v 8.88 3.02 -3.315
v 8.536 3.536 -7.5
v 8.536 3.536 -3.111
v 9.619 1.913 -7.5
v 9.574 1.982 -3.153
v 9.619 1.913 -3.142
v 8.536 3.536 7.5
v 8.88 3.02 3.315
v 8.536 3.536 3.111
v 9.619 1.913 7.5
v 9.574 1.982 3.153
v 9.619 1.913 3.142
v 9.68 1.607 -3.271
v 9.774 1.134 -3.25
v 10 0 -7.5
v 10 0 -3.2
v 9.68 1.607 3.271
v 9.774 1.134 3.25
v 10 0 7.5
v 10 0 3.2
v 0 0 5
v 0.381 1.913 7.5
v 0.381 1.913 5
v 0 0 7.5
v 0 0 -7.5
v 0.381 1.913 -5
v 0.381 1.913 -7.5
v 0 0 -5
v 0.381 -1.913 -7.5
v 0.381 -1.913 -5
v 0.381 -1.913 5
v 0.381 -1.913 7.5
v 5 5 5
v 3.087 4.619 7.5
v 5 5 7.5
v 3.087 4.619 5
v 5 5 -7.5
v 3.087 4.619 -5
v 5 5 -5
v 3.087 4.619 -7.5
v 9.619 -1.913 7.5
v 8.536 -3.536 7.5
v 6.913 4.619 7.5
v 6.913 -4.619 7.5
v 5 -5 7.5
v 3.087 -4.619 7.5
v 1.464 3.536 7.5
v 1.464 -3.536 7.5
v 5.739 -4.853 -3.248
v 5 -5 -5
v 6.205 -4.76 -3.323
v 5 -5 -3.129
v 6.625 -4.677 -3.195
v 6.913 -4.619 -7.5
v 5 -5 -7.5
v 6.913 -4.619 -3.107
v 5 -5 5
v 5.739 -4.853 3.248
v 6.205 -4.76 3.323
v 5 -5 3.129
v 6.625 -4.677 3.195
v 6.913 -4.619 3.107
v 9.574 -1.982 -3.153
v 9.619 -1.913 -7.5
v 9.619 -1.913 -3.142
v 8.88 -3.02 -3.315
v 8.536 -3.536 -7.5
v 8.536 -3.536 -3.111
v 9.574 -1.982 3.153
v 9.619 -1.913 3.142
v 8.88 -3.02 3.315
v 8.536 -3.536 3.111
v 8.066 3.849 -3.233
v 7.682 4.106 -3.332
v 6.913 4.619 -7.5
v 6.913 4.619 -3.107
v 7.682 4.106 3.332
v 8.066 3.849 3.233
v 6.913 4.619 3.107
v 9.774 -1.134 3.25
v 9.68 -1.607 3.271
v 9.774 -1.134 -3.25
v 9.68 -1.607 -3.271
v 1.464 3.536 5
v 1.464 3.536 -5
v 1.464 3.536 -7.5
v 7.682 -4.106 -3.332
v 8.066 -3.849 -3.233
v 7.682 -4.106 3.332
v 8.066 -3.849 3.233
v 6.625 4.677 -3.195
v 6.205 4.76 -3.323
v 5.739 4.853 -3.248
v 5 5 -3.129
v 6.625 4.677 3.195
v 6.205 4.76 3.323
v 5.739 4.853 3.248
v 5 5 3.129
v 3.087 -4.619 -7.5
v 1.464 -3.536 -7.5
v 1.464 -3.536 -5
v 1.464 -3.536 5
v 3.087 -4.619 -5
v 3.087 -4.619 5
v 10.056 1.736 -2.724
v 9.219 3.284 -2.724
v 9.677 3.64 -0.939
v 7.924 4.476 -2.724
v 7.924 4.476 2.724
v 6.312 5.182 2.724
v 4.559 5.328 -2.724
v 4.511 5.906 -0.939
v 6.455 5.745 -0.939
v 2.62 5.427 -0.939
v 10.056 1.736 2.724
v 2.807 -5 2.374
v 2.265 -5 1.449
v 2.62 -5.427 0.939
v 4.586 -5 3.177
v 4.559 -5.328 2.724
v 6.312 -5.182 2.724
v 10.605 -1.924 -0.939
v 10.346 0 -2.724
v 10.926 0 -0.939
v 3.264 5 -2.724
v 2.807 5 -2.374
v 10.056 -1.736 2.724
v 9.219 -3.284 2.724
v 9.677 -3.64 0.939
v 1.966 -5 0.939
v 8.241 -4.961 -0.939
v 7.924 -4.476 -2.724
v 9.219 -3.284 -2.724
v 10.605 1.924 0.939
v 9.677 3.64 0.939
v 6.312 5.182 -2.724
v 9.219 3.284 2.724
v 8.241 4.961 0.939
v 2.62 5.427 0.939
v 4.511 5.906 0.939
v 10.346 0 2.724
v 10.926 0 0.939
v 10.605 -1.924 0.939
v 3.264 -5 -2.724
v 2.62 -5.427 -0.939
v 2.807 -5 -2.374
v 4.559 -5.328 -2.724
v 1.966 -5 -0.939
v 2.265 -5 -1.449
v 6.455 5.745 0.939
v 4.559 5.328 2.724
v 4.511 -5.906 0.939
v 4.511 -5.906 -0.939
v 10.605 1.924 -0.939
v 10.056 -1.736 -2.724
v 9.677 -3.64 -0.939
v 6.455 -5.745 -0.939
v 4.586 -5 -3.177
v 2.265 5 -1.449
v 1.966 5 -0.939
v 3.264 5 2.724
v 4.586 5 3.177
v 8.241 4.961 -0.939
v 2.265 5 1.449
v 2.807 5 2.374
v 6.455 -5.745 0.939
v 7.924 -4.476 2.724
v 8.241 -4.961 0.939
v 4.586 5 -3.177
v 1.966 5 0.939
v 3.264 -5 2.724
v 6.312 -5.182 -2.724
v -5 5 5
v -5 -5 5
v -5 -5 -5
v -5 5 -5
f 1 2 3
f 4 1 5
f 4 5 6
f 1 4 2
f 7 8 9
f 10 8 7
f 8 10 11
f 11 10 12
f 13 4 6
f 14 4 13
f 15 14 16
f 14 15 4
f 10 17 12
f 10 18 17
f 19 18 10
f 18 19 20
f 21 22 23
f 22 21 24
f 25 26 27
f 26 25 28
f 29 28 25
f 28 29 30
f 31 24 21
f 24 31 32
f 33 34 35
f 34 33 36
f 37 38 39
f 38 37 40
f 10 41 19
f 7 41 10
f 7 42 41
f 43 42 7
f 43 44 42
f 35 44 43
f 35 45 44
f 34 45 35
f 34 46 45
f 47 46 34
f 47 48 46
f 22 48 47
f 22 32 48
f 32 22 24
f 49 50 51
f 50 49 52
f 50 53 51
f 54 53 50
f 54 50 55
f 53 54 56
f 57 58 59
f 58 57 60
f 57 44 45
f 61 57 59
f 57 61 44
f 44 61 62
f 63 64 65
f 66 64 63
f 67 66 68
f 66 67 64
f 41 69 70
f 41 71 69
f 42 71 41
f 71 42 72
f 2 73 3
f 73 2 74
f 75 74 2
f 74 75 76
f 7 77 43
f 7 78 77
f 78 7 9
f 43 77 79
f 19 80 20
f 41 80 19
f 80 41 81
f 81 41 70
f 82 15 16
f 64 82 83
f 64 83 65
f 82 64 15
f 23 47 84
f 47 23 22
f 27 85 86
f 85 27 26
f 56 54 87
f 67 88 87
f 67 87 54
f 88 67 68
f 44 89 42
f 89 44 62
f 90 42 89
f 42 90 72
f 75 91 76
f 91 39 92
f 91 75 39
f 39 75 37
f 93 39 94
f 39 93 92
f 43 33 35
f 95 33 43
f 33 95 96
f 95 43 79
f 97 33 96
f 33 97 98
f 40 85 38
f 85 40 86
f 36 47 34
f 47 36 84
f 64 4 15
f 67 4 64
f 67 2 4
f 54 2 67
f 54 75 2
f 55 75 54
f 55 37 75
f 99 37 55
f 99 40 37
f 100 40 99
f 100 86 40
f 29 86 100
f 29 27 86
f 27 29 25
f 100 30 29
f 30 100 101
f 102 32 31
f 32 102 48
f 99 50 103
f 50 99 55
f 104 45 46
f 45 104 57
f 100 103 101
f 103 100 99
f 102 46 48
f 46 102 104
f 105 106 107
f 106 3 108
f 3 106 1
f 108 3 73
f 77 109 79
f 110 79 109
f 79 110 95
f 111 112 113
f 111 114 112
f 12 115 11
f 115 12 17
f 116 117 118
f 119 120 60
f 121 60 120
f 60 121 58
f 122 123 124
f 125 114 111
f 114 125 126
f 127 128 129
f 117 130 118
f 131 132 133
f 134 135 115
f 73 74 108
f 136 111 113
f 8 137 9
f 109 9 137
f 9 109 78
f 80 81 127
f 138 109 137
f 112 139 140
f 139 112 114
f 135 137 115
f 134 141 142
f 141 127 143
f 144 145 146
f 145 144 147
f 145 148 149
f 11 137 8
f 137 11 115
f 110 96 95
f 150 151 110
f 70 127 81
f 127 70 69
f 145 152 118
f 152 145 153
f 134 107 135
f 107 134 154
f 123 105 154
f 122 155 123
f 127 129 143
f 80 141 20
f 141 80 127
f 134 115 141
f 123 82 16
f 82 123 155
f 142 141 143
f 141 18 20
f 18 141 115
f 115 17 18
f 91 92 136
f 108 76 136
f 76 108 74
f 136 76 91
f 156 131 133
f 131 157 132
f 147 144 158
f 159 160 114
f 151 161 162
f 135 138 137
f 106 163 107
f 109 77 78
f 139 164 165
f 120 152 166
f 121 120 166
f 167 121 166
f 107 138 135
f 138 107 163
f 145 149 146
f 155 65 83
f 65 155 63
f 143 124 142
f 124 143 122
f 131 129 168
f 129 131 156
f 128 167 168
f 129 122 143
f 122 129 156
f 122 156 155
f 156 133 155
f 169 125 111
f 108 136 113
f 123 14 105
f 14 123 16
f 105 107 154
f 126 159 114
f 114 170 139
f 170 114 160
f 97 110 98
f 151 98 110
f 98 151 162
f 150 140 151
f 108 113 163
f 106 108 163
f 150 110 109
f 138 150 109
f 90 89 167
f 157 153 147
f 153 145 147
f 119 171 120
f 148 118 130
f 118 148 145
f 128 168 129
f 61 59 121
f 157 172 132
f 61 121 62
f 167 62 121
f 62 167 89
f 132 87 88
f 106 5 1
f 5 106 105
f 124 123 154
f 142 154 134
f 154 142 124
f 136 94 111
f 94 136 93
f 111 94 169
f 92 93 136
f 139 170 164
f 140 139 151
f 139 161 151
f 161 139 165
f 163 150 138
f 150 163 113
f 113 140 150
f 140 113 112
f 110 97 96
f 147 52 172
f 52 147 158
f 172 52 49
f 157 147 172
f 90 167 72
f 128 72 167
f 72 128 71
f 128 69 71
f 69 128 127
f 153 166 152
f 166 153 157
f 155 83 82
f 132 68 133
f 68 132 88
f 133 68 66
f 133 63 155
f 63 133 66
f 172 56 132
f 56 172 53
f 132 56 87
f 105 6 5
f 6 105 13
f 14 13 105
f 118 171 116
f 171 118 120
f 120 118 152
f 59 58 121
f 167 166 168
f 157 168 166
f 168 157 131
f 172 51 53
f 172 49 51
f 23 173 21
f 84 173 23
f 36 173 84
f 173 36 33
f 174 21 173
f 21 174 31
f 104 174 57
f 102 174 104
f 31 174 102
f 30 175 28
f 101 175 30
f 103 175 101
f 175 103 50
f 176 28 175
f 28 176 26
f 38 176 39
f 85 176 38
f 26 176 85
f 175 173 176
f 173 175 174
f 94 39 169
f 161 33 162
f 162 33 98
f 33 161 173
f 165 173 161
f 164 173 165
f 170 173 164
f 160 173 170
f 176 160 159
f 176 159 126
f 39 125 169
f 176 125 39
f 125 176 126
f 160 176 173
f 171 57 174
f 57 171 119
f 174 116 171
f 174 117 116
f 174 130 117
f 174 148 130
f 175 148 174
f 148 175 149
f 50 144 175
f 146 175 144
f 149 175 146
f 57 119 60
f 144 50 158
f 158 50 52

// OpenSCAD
// Size of the Cube (all directions)
cuSize = 10;

// The diameter of the Cylinder
cyDia = 10;

// The height of the Cylinder
cyHei = 15;

// The radius of the Sphere
sphereRadius = 6;

// X-Translation of the Cylinder and Sphere
tX = 5;

// Create Cube and move Cylinder and Sphere by 'tX'
// You need to use {} around the shapes to translate
cube(size = [cuSize, cuSize, cuSize], center = true);
translate([tX, 0, 0]){
    cylinder(d = cyDia, h = cyHei, center = true);
    sphere(r = sphereRadius);
}
